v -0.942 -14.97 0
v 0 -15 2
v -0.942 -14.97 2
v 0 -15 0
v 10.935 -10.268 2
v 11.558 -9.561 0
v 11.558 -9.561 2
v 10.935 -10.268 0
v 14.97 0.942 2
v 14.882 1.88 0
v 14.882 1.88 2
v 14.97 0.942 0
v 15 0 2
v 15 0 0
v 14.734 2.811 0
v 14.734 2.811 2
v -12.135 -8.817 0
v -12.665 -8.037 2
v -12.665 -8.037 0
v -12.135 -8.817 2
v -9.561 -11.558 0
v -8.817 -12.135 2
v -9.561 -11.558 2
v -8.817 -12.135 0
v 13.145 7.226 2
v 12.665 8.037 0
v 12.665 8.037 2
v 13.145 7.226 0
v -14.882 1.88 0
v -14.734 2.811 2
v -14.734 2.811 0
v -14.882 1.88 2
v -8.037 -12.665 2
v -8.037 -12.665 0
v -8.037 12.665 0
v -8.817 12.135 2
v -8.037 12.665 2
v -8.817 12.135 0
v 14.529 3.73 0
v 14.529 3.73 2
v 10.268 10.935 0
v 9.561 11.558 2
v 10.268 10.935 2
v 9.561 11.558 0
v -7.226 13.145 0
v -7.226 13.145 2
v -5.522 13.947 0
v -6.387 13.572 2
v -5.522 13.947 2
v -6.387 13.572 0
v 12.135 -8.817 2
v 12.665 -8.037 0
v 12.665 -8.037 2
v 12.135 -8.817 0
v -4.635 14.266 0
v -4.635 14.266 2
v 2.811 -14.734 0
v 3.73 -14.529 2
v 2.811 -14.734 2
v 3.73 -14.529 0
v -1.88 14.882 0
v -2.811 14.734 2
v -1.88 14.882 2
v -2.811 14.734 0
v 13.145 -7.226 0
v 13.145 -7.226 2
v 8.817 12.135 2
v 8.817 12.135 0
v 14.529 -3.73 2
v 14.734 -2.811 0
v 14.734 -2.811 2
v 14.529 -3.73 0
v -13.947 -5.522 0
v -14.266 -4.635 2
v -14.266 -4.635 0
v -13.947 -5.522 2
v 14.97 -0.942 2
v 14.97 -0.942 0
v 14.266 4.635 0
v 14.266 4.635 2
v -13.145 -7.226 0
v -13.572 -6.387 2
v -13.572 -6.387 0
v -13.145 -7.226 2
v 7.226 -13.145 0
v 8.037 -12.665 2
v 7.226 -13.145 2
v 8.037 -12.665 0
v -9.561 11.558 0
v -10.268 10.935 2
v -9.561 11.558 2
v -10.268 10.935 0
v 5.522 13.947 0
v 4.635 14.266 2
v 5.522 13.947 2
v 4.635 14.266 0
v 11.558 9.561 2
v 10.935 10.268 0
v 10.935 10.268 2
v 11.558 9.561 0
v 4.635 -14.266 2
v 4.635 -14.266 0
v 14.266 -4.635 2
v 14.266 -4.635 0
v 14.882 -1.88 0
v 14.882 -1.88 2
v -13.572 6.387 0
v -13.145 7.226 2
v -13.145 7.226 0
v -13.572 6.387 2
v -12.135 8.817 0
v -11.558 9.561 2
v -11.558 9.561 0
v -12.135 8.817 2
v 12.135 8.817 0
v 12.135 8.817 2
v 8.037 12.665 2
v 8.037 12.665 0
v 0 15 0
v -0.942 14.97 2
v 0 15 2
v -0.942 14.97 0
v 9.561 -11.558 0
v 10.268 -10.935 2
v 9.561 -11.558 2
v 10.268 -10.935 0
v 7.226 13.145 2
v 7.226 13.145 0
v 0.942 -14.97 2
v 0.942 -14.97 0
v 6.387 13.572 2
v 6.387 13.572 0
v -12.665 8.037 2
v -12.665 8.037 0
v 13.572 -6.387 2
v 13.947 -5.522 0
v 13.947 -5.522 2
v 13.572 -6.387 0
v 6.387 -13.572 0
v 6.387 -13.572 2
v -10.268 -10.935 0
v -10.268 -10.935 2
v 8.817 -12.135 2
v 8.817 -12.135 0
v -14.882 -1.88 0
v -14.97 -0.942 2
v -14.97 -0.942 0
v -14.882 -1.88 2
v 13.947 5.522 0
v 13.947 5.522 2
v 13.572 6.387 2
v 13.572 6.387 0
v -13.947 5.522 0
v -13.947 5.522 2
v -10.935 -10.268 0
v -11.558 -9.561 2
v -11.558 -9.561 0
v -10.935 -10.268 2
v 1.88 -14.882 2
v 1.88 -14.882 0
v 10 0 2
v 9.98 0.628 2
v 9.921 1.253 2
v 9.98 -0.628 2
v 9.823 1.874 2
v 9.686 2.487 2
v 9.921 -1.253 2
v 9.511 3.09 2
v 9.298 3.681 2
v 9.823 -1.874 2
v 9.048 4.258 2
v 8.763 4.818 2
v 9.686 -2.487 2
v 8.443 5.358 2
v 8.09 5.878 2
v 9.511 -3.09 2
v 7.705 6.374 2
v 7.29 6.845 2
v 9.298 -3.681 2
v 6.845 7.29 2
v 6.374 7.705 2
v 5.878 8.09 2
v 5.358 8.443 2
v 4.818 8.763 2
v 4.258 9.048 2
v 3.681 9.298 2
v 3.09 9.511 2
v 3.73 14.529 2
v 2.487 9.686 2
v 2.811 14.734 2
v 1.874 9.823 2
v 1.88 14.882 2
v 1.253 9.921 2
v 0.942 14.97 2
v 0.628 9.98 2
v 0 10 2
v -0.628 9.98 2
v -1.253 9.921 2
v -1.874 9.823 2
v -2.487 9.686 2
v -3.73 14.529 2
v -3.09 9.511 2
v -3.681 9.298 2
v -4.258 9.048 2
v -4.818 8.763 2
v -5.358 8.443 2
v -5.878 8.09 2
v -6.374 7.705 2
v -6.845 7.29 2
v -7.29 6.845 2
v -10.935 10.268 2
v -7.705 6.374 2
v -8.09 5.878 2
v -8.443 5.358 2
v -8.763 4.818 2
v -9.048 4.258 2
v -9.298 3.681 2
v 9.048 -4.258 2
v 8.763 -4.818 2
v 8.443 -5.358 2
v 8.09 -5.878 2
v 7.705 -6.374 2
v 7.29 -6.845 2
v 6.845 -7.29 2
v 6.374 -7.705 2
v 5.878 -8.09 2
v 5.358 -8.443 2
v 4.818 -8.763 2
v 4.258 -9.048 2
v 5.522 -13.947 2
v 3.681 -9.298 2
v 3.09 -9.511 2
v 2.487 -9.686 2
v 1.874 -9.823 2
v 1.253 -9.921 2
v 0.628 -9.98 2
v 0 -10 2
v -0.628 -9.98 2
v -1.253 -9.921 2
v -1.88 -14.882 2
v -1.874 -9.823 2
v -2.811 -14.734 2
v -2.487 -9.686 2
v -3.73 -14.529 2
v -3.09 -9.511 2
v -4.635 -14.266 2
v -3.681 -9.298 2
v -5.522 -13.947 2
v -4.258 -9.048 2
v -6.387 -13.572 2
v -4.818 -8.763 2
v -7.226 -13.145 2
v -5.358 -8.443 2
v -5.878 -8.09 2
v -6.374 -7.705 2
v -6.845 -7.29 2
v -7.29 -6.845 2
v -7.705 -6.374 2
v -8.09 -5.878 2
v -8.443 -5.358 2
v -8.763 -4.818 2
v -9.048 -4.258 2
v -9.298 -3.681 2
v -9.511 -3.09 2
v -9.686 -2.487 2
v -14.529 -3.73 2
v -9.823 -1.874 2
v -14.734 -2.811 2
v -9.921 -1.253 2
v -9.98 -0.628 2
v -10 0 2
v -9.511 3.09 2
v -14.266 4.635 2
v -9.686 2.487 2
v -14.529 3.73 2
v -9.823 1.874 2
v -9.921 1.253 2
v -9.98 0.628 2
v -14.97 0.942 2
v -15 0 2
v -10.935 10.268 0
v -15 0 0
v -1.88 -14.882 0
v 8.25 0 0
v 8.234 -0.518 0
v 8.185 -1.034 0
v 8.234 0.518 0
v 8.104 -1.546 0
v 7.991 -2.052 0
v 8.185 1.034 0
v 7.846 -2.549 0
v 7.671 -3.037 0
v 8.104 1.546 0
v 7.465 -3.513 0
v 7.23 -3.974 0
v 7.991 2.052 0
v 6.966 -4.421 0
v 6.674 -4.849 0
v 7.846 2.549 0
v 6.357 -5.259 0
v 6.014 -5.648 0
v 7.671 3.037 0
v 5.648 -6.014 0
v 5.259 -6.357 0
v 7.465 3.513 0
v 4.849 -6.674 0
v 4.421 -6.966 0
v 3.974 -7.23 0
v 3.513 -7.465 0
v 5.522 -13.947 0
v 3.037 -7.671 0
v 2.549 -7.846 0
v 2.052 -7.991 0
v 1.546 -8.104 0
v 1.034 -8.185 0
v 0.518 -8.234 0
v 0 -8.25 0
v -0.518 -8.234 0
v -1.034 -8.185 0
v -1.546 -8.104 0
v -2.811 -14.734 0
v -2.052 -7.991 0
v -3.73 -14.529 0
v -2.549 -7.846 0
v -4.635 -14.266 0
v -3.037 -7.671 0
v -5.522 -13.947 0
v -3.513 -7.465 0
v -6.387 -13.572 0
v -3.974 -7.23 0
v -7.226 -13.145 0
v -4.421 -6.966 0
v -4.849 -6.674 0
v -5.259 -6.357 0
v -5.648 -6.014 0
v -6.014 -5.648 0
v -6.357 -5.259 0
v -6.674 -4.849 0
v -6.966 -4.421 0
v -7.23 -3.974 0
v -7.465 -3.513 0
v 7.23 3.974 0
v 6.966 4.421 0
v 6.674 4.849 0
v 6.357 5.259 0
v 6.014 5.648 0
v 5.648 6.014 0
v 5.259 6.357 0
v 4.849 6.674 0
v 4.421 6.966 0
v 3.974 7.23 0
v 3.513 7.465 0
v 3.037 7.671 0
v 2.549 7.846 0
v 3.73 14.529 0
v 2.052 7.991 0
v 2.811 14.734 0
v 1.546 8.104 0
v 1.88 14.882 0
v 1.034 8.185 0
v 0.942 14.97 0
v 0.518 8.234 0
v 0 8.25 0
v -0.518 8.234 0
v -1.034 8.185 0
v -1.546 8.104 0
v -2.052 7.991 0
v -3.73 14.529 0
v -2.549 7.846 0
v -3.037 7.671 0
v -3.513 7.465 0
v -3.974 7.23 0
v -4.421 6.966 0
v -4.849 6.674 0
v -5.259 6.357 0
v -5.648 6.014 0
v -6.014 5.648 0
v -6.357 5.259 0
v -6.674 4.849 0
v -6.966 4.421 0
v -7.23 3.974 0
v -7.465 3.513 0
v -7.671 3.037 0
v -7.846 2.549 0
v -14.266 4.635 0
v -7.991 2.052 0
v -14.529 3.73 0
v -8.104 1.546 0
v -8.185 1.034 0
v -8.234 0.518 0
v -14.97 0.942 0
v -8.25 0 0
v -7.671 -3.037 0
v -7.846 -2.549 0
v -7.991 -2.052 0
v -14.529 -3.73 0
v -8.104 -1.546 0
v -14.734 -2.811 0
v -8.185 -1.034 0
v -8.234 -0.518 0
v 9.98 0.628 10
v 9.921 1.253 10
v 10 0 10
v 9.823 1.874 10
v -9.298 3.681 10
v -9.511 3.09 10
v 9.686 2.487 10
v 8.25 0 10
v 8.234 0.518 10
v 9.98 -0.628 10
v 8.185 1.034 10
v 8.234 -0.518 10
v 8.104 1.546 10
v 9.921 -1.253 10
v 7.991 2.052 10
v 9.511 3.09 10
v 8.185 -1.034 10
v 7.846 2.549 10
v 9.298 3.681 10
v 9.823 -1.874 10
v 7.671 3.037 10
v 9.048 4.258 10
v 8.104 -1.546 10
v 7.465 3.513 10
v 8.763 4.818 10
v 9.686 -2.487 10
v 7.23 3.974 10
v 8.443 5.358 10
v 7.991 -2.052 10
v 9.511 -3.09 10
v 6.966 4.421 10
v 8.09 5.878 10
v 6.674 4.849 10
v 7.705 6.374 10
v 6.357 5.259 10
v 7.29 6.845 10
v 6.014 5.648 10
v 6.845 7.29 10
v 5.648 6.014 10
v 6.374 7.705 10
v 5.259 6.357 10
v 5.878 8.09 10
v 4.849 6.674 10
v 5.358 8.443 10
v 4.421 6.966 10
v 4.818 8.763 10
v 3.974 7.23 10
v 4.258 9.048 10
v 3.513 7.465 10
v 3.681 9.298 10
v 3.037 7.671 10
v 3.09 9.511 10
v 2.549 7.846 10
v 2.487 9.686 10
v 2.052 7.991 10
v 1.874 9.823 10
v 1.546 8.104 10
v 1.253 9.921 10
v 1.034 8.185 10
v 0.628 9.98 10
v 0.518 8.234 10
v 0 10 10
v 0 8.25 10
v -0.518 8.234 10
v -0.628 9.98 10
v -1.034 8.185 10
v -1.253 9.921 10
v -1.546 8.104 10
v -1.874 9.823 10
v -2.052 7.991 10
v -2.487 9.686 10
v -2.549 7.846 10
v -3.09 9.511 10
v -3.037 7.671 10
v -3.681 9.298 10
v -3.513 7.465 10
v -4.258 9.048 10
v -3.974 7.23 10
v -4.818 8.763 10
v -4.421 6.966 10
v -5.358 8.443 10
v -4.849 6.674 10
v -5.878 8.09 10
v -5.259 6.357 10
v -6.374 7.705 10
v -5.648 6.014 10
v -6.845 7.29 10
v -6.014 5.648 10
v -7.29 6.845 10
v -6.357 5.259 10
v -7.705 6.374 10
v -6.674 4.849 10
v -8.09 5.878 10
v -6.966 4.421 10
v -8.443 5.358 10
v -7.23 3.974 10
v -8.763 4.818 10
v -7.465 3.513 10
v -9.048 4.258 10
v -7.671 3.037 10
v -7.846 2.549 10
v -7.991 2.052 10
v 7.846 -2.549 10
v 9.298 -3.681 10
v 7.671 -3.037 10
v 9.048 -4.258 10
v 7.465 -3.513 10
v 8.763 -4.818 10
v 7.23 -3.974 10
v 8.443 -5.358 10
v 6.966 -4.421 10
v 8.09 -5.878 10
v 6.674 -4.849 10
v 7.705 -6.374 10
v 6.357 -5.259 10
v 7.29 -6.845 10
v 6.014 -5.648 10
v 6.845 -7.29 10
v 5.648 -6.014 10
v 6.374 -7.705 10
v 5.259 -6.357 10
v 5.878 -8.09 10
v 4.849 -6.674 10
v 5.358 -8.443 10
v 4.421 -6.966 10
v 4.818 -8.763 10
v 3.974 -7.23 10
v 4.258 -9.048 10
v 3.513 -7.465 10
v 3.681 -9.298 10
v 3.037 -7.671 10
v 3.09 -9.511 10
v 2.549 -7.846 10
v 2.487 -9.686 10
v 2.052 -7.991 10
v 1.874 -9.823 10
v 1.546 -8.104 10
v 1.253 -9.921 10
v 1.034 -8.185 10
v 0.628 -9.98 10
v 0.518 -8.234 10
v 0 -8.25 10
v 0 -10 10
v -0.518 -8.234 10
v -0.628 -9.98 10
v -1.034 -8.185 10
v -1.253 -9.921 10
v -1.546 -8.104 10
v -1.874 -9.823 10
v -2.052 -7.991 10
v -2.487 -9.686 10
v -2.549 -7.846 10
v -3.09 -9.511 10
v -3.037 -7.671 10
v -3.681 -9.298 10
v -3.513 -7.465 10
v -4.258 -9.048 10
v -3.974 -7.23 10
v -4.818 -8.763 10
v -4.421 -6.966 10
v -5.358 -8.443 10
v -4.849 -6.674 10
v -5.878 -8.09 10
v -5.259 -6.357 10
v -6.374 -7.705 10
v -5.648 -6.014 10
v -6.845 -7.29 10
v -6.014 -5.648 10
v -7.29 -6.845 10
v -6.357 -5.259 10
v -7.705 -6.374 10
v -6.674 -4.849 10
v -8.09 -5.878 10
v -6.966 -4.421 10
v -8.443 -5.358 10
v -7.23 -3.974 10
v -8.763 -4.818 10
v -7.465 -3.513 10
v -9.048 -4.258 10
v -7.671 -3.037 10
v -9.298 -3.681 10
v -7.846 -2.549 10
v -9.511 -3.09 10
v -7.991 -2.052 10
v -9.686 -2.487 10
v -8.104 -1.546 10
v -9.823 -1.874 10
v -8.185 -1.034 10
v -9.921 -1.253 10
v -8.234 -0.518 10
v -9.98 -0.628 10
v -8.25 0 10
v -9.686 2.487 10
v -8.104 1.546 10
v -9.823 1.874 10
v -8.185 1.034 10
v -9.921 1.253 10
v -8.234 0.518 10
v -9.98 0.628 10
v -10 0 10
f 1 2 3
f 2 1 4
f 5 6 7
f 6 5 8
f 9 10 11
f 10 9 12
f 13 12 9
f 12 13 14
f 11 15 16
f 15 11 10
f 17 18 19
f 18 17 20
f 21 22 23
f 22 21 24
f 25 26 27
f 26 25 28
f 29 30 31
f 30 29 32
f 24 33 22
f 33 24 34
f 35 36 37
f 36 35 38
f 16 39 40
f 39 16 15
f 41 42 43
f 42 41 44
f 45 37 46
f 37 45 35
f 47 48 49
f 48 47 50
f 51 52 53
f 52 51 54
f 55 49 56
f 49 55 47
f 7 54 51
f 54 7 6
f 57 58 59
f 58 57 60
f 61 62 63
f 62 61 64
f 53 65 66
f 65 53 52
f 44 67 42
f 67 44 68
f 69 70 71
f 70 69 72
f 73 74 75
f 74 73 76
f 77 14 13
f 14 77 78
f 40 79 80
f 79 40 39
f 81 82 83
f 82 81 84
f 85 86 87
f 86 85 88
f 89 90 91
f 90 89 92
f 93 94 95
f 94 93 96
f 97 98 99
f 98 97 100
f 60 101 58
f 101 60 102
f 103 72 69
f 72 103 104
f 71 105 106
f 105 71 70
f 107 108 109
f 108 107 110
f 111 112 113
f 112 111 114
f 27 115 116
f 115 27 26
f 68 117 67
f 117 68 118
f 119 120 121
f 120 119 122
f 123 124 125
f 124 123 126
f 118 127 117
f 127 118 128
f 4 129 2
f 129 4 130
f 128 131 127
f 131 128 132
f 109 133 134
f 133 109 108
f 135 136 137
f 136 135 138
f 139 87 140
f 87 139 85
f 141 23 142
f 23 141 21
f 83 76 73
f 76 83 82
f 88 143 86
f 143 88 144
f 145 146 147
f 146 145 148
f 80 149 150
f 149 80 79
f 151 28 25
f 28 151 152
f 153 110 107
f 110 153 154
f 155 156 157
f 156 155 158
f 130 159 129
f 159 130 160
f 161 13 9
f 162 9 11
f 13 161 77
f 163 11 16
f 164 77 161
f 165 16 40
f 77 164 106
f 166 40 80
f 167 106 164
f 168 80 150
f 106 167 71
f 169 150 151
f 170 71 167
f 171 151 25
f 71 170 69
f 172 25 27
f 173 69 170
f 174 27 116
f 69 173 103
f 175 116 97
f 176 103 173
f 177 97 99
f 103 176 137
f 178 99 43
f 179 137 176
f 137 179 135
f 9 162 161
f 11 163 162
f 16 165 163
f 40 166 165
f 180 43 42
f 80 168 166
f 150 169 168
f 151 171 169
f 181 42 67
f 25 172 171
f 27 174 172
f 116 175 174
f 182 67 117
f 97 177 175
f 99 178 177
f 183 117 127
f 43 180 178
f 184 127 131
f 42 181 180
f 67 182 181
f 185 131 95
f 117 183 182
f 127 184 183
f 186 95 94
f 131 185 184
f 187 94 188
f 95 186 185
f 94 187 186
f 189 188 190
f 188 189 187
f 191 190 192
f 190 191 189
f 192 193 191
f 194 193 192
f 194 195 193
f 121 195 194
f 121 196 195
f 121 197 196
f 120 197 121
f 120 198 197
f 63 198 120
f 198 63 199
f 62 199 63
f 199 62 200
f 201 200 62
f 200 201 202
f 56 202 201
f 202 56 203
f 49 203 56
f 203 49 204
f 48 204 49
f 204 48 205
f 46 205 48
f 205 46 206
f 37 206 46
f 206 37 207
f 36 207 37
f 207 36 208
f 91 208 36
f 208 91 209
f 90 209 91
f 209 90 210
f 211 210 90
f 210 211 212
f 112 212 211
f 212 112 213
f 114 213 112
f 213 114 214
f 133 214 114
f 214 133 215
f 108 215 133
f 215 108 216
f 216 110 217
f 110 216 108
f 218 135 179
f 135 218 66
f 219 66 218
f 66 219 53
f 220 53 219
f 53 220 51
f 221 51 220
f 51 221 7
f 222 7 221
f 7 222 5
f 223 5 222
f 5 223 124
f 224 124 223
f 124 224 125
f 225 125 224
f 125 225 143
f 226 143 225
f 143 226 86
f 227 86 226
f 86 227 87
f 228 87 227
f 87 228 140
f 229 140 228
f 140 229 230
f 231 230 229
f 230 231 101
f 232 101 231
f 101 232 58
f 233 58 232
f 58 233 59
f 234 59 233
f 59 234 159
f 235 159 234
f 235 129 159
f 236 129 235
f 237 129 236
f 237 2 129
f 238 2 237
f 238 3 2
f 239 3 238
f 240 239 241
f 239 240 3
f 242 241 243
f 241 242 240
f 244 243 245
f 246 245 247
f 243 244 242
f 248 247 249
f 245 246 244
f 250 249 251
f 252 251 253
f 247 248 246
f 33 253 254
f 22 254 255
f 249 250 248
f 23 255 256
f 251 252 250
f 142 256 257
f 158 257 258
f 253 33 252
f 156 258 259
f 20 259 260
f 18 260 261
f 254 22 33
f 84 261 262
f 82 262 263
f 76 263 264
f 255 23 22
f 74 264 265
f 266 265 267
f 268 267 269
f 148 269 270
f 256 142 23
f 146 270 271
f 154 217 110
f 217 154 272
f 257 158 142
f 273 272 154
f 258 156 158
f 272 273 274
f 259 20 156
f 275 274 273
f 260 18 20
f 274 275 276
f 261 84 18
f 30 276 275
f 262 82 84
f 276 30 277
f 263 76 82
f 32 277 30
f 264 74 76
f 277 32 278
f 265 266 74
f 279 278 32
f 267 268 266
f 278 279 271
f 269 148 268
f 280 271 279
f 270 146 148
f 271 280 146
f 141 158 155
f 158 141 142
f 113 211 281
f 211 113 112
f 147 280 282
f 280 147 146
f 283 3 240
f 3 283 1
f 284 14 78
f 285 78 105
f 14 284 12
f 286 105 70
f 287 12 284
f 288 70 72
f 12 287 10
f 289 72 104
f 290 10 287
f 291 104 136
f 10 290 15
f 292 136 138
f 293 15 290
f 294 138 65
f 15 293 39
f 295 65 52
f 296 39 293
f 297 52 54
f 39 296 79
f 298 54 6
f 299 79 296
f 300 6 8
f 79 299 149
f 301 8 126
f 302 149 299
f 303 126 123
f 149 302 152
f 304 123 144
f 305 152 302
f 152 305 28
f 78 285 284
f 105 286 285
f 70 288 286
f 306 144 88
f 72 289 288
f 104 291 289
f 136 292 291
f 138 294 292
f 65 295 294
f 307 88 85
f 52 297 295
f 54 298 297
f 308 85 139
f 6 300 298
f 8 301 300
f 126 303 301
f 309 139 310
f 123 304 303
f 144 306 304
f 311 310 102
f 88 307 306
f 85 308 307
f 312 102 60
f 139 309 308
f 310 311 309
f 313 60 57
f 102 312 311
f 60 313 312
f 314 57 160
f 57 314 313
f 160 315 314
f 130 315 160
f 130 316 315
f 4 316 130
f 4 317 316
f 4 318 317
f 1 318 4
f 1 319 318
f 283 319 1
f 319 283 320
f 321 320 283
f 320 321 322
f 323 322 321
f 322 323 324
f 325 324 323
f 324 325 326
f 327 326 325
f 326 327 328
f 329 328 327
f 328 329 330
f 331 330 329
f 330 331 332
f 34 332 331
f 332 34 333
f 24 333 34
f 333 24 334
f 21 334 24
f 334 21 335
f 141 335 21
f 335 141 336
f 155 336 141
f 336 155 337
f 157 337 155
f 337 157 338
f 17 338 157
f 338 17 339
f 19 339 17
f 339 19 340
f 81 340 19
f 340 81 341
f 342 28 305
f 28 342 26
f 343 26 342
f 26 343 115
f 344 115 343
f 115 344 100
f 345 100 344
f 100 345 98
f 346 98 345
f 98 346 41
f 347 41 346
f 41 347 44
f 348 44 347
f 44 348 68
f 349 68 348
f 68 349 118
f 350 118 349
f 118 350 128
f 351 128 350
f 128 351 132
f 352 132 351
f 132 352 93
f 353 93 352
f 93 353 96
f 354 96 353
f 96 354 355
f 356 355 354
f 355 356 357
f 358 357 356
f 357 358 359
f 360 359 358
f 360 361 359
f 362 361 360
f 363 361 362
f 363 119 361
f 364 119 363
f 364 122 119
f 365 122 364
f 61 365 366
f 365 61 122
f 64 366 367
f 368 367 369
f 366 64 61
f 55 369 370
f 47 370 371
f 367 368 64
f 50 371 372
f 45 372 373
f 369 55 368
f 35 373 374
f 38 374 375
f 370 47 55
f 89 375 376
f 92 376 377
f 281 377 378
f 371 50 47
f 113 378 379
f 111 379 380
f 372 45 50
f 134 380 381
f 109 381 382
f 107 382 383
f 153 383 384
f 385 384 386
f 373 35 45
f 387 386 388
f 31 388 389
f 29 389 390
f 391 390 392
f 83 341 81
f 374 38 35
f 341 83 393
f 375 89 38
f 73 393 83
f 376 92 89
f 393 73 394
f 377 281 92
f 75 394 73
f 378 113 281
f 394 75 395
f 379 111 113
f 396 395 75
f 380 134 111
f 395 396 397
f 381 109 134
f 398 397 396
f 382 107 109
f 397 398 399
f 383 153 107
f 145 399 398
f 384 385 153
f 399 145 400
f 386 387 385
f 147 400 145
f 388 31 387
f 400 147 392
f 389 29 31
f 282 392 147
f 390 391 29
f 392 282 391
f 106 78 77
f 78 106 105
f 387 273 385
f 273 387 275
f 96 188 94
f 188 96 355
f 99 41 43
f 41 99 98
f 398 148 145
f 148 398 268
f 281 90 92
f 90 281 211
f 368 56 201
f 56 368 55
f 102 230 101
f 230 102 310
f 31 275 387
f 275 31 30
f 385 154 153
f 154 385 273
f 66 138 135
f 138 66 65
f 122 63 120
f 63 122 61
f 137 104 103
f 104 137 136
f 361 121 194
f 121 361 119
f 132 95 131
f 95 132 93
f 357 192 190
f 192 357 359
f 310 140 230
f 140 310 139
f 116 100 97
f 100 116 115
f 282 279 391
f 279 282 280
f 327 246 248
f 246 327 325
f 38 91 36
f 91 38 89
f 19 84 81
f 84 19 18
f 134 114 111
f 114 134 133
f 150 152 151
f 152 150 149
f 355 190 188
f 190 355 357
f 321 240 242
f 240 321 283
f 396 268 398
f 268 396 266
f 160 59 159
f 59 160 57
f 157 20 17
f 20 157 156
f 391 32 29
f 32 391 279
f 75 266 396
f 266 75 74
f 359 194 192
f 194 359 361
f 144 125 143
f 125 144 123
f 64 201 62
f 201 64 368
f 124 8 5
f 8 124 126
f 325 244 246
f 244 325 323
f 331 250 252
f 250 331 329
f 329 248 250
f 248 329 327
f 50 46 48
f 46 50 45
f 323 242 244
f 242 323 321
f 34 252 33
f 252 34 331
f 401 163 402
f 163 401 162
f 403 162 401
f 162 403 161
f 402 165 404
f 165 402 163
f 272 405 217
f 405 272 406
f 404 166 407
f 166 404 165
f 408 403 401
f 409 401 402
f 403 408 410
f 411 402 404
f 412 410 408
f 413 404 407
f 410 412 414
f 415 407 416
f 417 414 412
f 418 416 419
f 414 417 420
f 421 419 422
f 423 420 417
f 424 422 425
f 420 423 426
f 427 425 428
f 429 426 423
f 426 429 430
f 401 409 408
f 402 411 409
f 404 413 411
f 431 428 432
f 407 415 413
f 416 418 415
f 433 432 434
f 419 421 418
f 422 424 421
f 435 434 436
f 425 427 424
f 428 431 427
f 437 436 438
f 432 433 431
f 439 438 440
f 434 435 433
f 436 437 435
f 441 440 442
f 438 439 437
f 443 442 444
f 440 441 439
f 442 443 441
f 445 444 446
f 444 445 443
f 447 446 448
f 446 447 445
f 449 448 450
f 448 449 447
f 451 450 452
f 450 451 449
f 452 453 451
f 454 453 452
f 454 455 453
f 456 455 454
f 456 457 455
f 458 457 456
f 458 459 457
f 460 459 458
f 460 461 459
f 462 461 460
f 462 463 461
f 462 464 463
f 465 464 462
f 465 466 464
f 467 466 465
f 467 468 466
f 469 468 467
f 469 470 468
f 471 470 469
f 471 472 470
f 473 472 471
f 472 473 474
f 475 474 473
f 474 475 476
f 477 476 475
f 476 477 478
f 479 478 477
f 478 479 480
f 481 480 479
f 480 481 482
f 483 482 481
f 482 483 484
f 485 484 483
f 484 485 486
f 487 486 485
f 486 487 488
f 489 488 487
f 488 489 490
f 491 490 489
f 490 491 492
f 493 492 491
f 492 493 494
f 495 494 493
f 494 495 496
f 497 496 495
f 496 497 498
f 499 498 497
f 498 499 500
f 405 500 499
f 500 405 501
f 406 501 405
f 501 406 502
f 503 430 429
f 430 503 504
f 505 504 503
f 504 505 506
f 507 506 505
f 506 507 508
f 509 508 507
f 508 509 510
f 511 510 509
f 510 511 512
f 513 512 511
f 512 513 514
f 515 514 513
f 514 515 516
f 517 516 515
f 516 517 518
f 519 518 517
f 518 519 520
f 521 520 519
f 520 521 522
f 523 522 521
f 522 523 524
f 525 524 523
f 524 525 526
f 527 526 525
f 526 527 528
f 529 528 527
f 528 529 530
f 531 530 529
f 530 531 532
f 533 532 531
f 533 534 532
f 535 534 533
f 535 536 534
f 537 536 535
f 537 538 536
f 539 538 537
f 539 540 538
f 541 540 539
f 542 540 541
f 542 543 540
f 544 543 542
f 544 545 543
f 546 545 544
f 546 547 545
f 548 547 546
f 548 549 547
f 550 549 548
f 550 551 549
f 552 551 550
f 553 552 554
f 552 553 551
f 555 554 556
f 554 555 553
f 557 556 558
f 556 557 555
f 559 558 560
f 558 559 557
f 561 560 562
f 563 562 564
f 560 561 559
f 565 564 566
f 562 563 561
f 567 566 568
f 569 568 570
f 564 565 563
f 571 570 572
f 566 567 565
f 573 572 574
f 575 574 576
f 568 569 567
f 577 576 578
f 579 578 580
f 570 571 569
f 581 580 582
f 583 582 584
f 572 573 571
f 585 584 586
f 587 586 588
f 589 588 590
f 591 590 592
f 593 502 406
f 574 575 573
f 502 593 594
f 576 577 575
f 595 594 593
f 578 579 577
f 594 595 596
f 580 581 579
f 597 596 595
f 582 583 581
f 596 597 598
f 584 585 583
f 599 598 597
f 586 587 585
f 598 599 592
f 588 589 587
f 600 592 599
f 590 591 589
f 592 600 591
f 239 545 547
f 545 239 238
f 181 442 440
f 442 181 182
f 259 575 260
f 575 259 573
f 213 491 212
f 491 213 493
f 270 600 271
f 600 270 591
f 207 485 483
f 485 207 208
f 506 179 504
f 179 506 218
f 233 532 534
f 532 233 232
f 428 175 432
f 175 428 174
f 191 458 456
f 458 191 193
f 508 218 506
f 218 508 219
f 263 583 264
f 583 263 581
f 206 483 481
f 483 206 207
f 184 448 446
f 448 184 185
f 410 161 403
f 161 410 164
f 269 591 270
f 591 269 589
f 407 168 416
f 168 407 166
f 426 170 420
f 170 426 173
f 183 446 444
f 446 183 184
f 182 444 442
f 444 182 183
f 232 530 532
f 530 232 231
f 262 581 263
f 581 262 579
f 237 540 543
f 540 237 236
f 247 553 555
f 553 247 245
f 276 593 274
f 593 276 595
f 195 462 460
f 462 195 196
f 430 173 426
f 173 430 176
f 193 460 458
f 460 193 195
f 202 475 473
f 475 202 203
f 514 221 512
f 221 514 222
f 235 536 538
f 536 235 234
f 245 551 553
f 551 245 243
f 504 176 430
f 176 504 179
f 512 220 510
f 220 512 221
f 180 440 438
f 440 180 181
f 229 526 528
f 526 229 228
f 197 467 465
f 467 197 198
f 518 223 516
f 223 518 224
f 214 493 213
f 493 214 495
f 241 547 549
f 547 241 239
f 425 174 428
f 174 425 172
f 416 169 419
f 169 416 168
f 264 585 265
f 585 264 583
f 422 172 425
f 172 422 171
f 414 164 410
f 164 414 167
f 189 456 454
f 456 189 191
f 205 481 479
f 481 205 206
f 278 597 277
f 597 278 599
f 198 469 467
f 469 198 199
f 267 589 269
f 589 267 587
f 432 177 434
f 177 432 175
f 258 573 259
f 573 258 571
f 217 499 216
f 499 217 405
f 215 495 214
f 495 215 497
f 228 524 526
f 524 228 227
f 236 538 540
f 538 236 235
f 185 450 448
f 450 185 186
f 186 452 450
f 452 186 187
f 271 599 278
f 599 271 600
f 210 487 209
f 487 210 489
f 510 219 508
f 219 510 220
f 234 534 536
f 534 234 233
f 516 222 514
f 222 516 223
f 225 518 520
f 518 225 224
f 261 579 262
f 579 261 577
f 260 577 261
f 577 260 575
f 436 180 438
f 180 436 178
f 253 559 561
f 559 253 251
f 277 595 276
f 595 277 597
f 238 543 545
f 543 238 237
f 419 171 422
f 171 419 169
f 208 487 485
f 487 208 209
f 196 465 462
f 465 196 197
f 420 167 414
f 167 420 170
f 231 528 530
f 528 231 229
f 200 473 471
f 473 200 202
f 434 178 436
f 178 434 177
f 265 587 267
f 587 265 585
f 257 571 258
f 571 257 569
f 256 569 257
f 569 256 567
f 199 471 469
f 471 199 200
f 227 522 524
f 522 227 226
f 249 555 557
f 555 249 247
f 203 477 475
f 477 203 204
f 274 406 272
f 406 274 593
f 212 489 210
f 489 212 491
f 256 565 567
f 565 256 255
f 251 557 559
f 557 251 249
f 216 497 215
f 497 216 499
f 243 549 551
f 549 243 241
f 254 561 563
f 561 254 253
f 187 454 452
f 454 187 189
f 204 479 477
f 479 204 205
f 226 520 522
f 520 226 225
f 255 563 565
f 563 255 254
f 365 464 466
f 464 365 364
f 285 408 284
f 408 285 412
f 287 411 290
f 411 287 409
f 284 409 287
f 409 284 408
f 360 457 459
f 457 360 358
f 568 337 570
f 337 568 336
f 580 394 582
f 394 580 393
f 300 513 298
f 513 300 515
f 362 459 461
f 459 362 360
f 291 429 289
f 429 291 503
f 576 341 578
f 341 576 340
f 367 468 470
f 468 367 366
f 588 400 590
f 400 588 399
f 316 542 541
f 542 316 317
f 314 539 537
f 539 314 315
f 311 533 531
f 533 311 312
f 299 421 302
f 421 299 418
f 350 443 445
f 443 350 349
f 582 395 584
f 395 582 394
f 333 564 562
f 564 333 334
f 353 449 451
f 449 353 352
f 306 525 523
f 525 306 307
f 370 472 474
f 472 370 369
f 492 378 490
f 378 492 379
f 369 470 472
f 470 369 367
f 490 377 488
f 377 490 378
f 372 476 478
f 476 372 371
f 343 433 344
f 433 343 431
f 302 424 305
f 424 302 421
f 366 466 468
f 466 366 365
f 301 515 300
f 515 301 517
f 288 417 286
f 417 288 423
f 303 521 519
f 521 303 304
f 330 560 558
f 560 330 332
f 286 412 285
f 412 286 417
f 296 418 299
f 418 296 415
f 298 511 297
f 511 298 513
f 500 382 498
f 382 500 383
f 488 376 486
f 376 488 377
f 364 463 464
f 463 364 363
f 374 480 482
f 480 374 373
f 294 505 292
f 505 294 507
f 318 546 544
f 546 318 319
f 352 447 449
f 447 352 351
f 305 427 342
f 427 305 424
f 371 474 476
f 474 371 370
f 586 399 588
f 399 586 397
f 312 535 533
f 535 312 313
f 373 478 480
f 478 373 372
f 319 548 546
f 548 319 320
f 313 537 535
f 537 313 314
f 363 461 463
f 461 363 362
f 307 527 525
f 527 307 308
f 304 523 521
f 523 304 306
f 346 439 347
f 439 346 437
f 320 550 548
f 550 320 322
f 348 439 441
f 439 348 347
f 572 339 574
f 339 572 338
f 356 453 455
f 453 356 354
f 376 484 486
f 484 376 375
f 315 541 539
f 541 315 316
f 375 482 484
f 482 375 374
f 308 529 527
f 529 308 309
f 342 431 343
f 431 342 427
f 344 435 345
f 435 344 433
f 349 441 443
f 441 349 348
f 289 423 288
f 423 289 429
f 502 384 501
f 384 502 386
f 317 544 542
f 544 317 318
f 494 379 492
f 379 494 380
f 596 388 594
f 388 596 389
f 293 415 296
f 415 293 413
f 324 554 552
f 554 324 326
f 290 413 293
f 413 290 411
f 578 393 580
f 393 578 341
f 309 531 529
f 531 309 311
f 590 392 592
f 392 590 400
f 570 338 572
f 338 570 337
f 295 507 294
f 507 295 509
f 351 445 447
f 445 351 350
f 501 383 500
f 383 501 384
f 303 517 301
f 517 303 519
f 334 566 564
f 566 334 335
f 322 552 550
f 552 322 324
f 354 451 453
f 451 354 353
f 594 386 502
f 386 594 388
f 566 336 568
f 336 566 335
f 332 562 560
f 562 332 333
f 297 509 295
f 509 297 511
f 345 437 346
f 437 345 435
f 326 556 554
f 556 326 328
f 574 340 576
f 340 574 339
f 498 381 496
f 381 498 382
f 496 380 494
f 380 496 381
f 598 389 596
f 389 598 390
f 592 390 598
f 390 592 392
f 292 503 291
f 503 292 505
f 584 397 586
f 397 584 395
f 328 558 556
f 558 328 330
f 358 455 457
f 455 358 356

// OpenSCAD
$fn=100;
difference() {
    union() {
        cylinder(h=2, d=30);
        cylinder(h=10, d=20);
    }
    translate([0,0,-.1]) cylinder(h=10.2, d=16.5);
}
